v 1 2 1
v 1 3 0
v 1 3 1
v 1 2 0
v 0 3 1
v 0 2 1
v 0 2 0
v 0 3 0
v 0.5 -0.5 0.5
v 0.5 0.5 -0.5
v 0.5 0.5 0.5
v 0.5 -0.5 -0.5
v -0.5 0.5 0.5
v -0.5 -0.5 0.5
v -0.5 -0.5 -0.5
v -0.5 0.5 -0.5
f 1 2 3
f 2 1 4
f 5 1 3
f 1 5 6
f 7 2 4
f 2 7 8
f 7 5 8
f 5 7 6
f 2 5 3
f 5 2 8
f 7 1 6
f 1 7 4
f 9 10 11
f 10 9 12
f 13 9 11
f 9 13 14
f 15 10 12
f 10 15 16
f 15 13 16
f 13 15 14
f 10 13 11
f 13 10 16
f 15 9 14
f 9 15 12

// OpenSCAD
// file: ../ifsolid.scad
/* ifsolid.scad: Collision detection conditional for OpenSCAD.
 *
 * Originally by Lucas V. Hartmann <lhartmann@github.com>, 2016.
 * Dual licenced under Creative Commons Attribution-Share Alike 3.0 and LGPL2 or later
 */
 
// Usage:
// ifsolid() {
//     solid_under_test;
//     true_output;  // Test is not empty
//     false_output; // Test is empty
// }
// BIG is the diameter of a sphere large enough to enclose everything.
module ifsolid(BIG=1000) {
	intersection() {
		universe();
		
		intersection() {
			union() {
				children(1);
			}
			minkowski() {
				union() {
					children(0);
					far_far_away();
				}
				universe();
			}
		}
	}
	
	intersection() {
		universe();
		
		difference() {
			children(2);
			minkowski() {
				union() {
					children(0);
					far_far_away();
				}
				universe();
			}
		}
	}
	
	module far_far_away() {
		translate(10*[BIG,BIG,BIG]) cube();
	}
	module universe() {
		cube(BIG*[2,2,2], center=true);
	}
}

// How to propagate ifsolid onto variables:
// ifsolid() {
//     test_solid(); // If test_solid is...
//     varsolid(1); // ... not empty, then render varsolid with parameter 1
//     varsolid(5); // ... empty, then render varsolid with parameter = 5
// }
// Both versions of varsolid are actually rendered, but only one will be in the result.
// main file
include <../ifsolid.scad>

// Visual aid,same condition as the intersection test
translate([0,2,0]) {
    cube();
    translate([3*sin(360*$t),0,0]) cube();
}

ifsolid() {
    // Condition solid. VOID = false, anything else = true.
    intersection() {
        cube();
        translate([3*sin(360*$t),0,0]) cube();
    }
    
    // Returned solid if conditon is true
    cube(center=true);
    
    // Returned solid if condition is false
    sphere();
}
